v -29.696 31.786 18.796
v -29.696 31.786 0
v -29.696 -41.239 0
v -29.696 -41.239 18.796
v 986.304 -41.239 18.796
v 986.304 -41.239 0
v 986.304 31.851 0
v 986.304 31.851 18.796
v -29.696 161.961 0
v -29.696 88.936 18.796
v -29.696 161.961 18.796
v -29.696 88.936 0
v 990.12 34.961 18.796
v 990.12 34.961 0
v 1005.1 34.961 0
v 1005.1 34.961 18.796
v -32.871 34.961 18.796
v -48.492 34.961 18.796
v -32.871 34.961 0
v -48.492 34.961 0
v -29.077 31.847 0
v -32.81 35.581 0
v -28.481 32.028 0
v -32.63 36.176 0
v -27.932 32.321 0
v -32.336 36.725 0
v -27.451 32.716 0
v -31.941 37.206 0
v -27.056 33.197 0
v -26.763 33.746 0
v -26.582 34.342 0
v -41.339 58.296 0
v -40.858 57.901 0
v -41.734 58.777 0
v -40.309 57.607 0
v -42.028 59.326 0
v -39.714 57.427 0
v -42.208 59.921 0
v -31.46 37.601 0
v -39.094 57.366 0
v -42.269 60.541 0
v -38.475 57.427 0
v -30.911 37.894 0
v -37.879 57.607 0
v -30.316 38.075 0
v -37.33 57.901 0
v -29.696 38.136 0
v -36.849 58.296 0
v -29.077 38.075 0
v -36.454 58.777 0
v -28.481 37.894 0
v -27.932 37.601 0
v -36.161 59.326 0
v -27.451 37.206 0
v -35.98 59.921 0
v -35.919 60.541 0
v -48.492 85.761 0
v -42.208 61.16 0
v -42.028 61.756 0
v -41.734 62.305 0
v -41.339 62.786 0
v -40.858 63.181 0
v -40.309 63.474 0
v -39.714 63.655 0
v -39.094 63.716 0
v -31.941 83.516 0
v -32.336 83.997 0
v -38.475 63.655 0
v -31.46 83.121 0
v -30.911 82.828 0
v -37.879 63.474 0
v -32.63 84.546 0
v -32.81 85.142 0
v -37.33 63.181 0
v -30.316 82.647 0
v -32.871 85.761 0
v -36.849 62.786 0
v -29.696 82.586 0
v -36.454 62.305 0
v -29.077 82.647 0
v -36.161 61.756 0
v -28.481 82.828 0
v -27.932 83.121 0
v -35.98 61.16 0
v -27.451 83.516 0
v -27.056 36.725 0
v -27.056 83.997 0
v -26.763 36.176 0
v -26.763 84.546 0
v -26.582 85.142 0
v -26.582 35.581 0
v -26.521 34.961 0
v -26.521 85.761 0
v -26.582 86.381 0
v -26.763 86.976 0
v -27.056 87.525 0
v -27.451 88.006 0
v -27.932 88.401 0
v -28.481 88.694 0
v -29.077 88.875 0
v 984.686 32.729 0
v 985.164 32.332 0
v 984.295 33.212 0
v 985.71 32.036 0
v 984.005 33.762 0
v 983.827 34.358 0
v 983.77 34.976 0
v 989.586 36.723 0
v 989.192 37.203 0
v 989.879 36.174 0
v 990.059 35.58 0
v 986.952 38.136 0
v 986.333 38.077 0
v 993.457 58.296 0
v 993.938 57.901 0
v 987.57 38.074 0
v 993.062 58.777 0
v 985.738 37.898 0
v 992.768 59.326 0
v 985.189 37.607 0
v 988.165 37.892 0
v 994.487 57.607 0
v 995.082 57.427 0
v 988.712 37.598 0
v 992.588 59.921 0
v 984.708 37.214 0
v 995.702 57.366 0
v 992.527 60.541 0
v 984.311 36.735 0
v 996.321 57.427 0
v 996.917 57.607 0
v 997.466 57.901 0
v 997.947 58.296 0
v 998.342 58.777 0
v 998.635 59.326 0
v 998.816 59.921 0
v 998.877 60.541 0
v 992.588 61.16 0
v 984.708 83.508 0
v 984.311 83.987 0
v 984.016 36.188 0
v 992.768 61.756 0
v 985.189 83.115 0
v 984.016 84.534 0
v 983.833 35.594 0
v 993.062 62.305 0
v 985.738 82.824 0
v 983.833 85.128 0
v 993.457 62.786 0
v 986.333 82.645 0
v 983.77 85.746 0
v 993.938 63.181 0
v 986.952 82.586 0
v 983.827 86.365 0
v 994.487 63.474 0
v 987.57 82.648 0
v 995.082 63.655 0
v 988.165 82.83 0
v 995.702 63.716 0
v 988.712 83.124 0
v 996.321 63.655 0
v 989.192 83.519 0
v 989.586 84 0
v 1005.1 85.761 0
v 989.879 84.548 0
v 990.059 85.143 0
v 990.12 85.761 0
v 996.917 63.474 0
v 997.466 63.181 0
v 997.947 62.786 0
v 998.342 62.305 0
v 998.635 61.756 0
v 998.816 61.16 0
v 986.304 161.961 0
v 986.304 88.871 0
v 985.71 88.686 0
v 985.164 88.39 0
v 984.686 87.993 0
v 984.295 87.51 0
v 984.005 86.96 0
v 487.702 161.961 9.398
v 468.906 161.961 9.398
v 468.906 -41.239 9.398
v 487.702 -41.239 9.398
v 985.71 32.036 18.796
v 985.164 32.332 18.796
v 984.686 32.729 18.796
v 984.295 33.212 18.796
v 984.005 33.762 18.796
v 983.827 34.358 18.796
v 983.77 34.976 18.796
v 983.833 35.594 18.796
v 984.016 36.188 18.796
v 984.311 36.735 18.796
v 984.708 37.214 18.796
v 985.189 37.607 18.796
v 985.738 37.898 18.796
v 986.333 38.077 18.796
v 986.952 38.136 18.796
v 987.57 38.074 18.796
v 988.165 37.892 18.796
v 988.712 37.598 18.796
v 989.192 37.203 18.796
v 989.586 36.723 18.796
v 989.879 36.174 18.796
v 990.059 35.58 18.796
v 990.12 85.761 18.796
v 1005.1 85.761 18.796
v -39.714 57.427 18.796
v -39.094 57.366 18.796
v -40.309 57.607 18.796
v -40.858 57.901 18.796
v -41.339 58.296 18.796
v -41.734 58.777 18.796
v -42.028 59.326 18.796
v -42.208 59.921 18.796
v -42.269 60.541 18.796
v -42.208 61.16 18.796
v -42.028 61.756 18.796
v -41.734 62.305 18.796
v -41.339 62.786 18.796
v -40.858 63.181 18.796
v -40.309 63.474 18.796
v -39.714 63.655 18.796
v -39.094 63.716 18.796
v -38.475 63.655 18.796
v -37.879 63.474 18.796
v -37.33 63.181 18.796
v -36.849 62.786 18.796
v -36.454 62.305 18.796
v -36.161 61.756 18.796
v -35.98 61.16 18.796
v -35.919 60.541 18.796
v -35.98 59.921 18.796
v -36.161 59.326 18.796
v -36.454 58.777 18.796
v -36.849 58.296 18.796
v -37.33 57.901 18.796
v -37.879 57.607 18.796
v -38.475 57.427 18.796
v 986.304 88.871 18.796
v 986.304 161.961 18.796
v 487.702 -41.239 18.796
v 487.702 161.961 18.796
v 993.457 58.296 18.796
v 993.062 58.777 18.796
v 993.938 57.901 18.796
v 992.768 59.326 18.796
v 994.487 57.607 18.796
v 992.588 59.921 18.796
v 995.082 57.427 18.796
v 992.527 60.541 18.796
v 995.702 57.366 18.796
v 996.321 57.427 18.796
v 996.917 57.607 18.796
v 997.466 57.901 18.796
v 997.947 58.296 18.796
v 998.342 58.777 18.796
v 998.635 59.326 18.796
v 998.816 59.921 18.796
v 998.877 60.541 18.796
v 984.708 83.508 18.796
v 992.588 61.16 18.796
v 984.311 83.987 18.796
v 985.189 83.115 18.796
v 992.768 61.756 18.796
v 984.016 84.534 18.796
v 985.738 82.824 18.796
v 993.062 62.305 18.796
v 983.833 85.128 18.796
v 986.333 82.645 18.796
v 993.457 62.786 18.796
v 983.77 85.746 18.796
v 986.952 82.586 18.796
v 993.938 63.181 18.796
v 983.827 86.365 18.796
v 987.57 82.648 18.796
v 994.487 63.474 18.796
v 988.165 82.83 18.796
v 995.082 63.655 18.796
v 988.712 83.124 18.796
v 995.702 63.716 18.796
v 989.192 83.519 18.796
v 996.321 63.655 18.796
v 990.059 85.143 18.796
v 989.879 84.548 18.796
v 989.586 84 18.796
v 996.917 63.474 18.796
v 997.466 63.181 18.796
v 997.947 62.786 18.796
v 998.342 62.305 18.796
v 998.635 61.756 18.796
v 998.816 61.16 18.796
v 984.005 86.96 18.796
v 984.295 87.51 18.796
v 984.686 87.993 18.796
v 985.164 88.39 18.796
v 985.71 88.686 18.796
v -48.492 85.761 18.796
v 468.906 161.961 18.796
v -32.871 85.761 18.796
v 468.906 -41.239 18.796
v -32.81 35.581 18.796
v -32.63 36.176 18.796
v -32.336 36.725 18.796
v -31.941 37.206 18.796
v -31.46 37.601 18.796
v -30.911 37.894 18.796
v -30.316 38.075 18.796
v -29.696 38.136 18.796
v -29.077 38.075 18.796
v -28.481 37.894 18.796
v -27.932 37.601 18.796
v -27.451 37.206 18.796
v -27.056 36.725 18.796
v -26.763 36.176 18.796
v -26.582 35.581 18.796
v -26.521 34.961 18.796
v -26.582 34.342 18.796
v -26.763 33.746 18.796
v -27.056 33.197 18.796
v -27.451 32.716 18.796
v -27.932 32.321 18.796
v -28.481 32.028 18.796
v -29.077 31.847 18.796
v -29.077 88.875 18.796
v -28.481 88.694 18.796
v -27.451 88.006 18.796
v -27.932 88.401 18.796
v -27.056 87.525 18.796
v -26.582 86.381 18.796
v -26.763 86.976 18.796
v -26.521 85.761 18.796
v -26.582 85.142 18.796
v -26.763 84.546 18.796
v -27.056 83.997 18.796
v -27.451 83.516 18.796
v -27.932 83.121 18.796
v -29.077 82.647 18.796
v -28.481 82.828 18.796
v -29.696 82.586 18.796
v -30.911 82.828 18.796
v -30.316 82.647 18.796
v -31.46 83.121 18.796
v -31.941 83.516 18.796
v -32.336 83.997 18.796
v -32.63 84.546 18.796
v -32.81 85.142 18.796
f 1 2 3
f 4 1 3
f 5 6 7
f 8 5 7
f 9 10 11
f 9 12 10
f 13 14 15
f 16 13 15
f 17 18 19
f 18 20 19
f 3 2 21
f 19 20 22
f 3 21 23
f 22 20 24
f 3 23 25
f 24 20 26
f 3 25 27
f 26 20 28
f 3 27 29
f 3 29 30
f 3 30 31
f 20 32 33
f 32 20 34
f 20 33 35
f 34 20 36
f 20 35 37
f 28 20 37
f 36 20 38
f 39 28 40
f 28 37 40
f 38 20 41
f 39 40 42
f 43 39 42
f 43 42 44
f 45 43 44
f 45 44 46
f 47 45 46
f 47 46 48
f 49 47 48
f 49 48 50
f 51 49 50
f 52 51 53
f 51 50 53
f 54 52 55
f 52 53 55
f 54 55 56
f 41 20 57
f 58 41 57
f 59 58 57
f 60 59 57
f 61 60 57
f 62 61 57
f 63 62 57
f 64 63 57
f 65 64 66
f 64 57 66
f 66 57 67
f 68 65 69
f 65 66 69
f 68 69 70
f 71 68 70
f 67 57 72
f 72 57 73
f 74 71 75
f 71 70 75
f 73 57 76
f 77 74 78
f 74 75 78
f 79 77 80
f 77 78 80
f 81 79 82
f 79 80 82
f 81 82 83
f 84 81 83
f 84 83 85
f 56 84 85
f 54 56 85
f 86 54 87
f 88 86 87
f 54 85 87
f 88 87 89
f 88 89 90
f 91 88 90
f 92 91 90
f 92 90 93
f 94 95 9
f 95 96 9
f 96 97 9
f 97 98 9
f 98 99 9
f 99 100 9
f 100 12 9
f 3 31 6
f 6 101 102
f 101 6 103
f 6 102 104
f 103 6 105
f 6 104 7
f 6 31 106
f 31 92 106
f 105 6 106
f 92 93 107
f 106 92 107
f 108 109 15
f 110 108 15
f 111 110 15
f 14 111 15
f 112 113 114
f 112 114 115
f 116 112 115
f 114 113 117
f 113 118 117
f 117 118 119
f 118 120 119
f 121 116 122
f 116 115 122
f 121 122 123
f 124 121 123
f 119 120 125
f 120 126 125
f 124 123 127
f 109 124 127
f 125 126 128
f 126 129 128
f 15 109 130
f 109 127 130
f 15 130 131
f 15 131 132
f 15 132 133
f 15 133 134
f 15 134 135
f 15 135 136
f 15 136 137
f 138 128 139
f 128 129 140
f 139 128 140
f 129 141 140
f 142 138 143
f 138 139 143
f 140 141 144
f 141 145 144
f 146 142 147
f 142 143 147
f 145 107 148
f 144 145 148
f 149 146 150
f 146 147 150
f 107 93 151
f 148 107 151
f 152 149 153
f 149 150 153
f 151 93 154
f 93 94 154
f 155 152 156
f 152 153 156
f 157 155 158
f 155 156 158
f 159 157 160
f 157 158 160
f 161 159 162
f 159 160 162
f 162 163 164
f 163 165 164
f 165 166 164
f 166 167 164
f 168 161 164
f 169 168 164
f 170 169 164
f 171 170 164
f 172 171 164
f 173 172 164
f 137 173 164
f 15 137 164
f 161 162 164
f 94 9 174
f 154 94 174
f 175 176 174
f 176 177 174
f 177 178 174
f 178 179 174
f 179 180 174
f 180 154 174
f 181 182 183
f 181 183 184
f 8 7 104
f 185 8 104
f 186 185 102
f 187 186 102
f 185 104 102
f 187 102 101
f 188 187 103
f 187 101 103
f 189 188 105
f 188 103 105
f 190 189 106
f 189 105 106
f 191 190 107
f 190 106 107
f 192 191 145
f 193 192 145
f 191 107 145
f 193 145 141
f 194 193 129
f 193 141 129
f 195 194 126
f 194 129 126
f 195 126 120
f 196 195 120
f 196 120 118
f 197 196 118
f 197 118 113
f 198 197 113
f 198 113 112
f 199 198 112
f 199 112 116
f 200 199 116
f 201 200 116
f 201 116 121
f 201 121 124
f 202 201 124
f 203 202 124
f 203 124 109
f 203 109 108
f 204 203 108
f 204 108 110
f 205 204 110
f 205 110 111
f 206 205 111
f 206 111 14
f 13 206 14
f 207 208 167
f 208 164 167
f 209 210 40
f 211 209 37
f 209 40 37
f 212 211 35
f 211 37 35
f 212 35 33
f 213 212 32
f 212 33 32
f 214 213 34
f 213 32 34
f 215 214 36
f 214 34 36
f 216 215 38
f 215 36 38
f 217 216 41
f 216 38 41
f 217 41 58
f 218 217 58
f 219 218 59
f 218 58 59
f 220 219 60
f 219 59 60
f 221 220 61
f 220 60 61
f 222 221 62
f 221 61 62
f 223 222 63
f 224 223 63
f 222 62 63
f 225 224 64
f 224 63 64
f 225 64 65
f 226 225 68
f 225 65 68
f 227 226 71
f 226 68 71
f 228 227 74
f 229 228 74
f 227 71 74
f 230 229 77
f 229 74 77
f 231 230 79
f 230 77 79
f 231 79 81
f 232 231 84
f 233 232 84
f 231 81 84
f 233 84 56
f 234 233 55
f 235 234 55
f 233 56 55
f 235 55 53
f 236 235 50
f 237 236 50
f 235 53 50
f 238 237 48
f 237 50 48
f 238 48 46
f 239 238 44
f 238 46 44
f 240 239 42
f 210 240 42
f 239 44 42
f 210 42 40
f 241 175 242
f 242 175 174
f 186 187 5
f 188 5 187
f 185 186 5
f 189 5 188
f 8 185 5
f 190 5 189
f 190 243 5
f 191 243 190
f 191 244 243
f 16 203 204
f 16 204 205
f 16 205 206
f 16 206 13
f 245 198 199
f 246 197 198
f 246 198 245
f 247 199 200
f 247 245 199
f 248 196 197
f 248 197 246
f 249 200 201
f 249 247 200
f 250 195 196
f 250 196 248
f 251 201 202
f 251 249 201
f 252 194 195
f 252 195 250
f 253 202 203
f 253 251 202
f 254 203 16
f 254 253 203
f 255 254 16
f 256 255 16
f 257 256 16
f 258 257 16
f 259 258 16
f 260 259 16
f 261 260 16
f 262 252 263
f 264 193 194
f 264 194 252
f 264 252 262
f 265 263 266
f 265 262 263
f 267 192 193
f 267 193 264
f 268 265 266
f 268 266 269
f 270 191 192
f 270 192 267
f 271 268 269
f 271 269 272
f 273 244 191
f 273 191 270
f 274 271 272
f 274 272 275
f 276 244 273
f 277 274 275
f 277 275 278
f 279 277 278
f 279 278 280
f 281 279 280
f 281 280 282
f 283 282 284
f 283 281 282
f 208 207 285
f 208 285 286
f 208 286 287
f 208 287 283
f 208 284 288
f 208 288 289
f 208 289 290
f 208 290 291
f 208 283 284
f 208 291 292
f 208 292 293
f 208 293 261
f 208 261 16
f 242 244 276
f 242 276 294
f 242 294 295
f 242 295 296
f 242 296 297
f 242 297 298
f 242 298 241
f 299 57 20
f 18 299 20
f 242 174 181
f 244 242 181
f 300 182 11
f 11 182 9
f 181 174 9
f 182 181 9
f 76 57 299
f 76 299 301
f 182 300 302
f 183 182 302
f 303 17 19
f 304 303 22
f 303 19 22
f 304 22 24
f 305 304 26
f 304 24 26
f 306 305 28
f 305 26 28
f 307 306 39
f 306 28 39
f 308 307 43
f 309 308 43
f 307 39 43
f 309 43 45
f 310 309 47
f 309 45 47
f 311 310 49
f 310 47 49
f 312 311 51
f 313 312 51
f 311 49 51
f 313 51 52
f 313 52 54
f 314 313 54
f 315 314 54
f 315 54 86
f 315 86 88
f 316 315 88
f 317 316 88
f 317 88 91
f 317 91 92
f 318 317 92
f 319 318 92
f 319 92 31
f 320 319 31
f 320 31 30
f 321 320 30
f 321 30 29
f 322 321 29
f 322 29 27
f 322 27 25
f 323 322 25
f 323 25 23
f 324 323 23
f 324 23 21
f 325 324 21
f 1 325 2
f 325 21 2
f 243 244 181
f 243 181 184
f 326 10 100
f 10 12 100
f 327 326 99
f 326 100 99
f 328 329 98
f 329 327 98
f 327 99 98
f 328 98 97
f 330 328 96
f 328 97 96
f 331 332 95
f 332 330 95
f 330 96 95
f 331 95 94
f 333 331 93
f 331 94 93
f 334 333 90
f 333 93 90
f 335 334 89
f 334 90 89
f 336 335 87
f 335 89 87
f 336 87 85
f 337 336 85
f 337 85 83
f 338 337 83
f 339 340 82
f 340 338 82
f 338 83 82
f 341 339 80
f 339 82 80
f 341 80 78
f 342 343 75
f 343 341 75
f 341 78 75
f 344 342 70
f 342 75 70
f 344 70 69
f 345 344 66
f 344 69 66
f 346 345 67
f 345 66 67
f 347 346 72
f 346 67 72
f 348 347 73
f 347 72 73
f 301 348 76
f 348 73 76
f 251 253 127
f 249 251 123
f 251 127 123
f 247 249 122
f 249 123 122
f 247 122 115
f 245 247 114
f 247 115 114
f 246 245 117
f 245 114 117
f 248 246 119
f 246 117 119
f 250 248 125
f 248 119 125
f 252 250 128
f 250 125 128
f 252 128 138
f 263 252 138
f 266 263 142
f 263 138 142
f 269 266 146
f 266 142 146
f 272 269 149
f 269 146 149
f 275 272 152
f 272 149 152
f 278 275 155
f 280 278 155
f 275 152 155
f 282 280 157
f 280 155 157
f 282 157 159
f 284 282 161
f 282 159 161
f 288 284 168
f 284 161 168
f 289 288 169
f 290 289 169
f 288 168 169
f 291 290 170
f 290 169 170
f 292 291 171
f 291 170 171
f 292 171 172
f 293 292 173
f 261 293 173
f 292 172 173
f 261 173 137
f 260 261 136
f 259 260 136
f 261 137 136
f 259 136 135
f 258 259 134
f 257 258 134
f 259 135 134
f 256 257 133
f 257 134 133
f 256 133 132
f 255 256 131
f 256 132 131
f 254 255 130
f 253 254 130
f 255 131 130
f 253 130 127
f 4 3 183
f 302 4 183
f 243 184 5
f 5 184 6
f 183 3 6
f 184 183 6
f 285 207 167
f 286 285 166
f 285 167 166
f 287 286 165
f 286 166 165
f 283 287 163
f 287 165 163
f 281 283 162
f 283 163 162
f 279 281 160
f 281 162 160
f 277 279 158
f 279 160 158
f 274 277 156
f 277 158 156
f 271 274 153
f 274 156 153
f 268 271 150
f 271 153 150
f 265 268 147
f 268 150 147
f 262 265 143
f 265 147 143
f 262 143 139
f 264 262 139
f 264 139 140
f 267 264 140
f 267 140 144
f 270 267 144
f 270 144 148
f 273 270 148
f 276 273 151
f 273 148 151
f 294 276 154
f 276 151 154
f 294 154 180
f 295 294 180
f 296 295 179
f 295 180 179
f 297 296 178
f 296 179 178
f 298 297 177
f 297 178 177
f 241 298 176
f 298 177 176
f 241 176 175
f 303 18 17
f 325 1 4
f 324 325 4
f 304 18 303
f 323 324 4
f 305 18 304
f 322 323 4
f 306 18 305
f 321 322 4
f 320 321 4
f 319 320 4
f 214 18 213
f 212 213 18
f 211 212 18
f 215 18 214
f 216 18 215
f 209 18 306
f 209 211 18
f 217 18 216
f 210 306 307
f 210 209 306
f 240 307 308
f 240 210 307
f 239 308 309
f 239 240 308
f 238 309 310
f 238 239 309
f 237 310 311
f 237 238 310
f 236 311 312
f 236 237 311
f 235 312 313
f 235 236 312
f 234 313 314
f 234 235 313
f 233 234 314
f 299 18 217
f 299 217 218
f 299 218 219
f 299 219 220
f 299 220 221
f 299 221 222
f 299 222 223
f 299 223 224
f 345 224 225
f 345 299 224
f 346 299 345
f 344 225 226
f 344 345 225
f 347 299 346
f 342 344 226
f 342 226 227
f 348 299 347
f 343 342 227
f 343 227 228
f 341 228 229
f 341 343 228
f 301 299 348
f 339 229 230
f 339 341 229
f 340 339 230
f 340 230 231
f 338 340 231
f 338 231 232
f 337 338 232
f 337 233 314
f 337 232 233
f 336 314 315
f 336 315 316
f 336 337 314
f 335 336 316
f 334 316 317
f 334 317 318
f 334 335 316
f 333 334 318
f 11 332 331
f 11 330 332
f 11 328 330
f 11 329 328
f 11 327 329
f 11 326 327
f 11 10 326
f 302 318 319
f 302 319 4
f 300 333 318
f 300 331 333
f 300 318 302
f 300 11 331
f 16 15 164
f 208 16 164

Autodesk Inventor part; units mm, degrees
ref_plane "YZ Plane" through (0, 0, 0) normal (1, 0, 0) x (0, 1, 0)
ref_plane "XZ Plane" through (0, 0, 0) normal (0, 1, 0) x (-1, 0, 0)
ref_plane "XY Plane" through (0, 0, 0) normal (0, 0, 1) x (1, 0, 0)
sketch "Sketch1" plane through (0, 0, 0) normal (0, 0, 1) x (1, 0, 0)
  line L0 (-48.4923, 85.7611) -> (-48.4923, 34.9611)
  line L1 (-48.4923, 34.9611) -> (-29.6963, 34.9611)
  line L2 (-29.6963, 34.9611) -> (-29.6963, -41.2389)
  line L3 (-29.6963, -41.2389) -> (986.3037, -41.2389)
  line L4 (986.3037, -41.2389) -> (986.3037, 34.9611)
  line L5 (986.3037, 34.9611) -> (1005.0997, 34.9611)
  line L6 (1005.0997, 34.9611) -> (1005.0997, 85.7611)
  line L7 (1005.0997, 85.7611) -> (986.3037, 85.7611)
  line L8 (986.3037, 85.7611) -> (986.3037, 161.9611)
  line L9 (986.3037, 161.9611) -> (-29.6963, 161.9611)
  line L10 (-48.4923, 85.7611) -> (-29.6963, 85.7611)
  line L11 (-29.6963, 85.7611) -> (-29.6963, 161.9611)
  point P0 (0, 0)
  dimension "d0" = 50.8
  dimension "d1" = 18.796
  dimension "d2" = 76.2
  dimension "d3" = 1016
  dimension "d4" = 76.2
  dimension "d5" = 18.796
  dimension "d6" = 50.8
  dimension "d7" = 76.2
  dimension "d8" = 18.796
extrude "Extrusion1" add sketch "Sketch1" along normal blind 18.796
sketch "Sketch2" plane through (0, 0, 18.796) normal (0, 0, 1) x (1, 0, 0)
  line L0 (-29.6963, 85.7611) -> (-48.4923, 85.7611) projected
  line L1 (-48.4923, 34.9611) -> (-29.6963, 34.9611) projected
  line L2 (1005.0997, 34.9611) -> (1005.0997, 85.7611) projected
  line L3 (-48.4923, 85.7611) -> (-48.4923, 34.9611) projected
  point P0 (0, 0)
  point P1 (-39.0943, 60.5407)
  point P2 (986.9445, 85.7611)
  point P3 (986.9445, 34.9611)
  point P4 (995.7017, 60.5407)
  dimension "d11" = 9.398
  dimension "d12" = 9.398
hole "Hole1" at (-29.6963, 85.7611, 18.796) at (-29.6963, 34.9611, 18.796) at (-39.0943, 60.5407, 18.796) at (986.9445, 85.7611, 18.796) at (986.9445, 34.9611, 18.796) at (995.7017, 60.5407, 18.796) direction (0, 0, -1) diameter 6.35 end through all
sketch "Sketch3" plane through (0, 0, 18.796) normal (0, 0, 1) x (1, 0, 0)
  line L0 (986.3037, 161.9611) -> (-29.6963, 161.9611) projected
  line L1 (478.3037, 161.9611) -> (478.3037, -41.2389)
  line L2 (-29.6963, -41.2389) -> (986.3037, -41.2389) projected
  line L3 (468.9057, 161.9611) -> (468.9057, -41.2389)
  line L4 (487.7017, 161.9611) -> (487.7017, -41.2389)
  line L5 (468.9057, 161.9611) -> (487.7017, 161.9611)
  line L6 (468.9057, -41.2389) -> (487.7017, -41.2389)
  point P0 (0, 0)
  dimension "d20" = 9.398
  dimension "d21" = 9.398
extrude "Extrusion2" cut sketch "Sketch3" against normal blind 9.398
properties part number "top" material "Wood (Birch)"
